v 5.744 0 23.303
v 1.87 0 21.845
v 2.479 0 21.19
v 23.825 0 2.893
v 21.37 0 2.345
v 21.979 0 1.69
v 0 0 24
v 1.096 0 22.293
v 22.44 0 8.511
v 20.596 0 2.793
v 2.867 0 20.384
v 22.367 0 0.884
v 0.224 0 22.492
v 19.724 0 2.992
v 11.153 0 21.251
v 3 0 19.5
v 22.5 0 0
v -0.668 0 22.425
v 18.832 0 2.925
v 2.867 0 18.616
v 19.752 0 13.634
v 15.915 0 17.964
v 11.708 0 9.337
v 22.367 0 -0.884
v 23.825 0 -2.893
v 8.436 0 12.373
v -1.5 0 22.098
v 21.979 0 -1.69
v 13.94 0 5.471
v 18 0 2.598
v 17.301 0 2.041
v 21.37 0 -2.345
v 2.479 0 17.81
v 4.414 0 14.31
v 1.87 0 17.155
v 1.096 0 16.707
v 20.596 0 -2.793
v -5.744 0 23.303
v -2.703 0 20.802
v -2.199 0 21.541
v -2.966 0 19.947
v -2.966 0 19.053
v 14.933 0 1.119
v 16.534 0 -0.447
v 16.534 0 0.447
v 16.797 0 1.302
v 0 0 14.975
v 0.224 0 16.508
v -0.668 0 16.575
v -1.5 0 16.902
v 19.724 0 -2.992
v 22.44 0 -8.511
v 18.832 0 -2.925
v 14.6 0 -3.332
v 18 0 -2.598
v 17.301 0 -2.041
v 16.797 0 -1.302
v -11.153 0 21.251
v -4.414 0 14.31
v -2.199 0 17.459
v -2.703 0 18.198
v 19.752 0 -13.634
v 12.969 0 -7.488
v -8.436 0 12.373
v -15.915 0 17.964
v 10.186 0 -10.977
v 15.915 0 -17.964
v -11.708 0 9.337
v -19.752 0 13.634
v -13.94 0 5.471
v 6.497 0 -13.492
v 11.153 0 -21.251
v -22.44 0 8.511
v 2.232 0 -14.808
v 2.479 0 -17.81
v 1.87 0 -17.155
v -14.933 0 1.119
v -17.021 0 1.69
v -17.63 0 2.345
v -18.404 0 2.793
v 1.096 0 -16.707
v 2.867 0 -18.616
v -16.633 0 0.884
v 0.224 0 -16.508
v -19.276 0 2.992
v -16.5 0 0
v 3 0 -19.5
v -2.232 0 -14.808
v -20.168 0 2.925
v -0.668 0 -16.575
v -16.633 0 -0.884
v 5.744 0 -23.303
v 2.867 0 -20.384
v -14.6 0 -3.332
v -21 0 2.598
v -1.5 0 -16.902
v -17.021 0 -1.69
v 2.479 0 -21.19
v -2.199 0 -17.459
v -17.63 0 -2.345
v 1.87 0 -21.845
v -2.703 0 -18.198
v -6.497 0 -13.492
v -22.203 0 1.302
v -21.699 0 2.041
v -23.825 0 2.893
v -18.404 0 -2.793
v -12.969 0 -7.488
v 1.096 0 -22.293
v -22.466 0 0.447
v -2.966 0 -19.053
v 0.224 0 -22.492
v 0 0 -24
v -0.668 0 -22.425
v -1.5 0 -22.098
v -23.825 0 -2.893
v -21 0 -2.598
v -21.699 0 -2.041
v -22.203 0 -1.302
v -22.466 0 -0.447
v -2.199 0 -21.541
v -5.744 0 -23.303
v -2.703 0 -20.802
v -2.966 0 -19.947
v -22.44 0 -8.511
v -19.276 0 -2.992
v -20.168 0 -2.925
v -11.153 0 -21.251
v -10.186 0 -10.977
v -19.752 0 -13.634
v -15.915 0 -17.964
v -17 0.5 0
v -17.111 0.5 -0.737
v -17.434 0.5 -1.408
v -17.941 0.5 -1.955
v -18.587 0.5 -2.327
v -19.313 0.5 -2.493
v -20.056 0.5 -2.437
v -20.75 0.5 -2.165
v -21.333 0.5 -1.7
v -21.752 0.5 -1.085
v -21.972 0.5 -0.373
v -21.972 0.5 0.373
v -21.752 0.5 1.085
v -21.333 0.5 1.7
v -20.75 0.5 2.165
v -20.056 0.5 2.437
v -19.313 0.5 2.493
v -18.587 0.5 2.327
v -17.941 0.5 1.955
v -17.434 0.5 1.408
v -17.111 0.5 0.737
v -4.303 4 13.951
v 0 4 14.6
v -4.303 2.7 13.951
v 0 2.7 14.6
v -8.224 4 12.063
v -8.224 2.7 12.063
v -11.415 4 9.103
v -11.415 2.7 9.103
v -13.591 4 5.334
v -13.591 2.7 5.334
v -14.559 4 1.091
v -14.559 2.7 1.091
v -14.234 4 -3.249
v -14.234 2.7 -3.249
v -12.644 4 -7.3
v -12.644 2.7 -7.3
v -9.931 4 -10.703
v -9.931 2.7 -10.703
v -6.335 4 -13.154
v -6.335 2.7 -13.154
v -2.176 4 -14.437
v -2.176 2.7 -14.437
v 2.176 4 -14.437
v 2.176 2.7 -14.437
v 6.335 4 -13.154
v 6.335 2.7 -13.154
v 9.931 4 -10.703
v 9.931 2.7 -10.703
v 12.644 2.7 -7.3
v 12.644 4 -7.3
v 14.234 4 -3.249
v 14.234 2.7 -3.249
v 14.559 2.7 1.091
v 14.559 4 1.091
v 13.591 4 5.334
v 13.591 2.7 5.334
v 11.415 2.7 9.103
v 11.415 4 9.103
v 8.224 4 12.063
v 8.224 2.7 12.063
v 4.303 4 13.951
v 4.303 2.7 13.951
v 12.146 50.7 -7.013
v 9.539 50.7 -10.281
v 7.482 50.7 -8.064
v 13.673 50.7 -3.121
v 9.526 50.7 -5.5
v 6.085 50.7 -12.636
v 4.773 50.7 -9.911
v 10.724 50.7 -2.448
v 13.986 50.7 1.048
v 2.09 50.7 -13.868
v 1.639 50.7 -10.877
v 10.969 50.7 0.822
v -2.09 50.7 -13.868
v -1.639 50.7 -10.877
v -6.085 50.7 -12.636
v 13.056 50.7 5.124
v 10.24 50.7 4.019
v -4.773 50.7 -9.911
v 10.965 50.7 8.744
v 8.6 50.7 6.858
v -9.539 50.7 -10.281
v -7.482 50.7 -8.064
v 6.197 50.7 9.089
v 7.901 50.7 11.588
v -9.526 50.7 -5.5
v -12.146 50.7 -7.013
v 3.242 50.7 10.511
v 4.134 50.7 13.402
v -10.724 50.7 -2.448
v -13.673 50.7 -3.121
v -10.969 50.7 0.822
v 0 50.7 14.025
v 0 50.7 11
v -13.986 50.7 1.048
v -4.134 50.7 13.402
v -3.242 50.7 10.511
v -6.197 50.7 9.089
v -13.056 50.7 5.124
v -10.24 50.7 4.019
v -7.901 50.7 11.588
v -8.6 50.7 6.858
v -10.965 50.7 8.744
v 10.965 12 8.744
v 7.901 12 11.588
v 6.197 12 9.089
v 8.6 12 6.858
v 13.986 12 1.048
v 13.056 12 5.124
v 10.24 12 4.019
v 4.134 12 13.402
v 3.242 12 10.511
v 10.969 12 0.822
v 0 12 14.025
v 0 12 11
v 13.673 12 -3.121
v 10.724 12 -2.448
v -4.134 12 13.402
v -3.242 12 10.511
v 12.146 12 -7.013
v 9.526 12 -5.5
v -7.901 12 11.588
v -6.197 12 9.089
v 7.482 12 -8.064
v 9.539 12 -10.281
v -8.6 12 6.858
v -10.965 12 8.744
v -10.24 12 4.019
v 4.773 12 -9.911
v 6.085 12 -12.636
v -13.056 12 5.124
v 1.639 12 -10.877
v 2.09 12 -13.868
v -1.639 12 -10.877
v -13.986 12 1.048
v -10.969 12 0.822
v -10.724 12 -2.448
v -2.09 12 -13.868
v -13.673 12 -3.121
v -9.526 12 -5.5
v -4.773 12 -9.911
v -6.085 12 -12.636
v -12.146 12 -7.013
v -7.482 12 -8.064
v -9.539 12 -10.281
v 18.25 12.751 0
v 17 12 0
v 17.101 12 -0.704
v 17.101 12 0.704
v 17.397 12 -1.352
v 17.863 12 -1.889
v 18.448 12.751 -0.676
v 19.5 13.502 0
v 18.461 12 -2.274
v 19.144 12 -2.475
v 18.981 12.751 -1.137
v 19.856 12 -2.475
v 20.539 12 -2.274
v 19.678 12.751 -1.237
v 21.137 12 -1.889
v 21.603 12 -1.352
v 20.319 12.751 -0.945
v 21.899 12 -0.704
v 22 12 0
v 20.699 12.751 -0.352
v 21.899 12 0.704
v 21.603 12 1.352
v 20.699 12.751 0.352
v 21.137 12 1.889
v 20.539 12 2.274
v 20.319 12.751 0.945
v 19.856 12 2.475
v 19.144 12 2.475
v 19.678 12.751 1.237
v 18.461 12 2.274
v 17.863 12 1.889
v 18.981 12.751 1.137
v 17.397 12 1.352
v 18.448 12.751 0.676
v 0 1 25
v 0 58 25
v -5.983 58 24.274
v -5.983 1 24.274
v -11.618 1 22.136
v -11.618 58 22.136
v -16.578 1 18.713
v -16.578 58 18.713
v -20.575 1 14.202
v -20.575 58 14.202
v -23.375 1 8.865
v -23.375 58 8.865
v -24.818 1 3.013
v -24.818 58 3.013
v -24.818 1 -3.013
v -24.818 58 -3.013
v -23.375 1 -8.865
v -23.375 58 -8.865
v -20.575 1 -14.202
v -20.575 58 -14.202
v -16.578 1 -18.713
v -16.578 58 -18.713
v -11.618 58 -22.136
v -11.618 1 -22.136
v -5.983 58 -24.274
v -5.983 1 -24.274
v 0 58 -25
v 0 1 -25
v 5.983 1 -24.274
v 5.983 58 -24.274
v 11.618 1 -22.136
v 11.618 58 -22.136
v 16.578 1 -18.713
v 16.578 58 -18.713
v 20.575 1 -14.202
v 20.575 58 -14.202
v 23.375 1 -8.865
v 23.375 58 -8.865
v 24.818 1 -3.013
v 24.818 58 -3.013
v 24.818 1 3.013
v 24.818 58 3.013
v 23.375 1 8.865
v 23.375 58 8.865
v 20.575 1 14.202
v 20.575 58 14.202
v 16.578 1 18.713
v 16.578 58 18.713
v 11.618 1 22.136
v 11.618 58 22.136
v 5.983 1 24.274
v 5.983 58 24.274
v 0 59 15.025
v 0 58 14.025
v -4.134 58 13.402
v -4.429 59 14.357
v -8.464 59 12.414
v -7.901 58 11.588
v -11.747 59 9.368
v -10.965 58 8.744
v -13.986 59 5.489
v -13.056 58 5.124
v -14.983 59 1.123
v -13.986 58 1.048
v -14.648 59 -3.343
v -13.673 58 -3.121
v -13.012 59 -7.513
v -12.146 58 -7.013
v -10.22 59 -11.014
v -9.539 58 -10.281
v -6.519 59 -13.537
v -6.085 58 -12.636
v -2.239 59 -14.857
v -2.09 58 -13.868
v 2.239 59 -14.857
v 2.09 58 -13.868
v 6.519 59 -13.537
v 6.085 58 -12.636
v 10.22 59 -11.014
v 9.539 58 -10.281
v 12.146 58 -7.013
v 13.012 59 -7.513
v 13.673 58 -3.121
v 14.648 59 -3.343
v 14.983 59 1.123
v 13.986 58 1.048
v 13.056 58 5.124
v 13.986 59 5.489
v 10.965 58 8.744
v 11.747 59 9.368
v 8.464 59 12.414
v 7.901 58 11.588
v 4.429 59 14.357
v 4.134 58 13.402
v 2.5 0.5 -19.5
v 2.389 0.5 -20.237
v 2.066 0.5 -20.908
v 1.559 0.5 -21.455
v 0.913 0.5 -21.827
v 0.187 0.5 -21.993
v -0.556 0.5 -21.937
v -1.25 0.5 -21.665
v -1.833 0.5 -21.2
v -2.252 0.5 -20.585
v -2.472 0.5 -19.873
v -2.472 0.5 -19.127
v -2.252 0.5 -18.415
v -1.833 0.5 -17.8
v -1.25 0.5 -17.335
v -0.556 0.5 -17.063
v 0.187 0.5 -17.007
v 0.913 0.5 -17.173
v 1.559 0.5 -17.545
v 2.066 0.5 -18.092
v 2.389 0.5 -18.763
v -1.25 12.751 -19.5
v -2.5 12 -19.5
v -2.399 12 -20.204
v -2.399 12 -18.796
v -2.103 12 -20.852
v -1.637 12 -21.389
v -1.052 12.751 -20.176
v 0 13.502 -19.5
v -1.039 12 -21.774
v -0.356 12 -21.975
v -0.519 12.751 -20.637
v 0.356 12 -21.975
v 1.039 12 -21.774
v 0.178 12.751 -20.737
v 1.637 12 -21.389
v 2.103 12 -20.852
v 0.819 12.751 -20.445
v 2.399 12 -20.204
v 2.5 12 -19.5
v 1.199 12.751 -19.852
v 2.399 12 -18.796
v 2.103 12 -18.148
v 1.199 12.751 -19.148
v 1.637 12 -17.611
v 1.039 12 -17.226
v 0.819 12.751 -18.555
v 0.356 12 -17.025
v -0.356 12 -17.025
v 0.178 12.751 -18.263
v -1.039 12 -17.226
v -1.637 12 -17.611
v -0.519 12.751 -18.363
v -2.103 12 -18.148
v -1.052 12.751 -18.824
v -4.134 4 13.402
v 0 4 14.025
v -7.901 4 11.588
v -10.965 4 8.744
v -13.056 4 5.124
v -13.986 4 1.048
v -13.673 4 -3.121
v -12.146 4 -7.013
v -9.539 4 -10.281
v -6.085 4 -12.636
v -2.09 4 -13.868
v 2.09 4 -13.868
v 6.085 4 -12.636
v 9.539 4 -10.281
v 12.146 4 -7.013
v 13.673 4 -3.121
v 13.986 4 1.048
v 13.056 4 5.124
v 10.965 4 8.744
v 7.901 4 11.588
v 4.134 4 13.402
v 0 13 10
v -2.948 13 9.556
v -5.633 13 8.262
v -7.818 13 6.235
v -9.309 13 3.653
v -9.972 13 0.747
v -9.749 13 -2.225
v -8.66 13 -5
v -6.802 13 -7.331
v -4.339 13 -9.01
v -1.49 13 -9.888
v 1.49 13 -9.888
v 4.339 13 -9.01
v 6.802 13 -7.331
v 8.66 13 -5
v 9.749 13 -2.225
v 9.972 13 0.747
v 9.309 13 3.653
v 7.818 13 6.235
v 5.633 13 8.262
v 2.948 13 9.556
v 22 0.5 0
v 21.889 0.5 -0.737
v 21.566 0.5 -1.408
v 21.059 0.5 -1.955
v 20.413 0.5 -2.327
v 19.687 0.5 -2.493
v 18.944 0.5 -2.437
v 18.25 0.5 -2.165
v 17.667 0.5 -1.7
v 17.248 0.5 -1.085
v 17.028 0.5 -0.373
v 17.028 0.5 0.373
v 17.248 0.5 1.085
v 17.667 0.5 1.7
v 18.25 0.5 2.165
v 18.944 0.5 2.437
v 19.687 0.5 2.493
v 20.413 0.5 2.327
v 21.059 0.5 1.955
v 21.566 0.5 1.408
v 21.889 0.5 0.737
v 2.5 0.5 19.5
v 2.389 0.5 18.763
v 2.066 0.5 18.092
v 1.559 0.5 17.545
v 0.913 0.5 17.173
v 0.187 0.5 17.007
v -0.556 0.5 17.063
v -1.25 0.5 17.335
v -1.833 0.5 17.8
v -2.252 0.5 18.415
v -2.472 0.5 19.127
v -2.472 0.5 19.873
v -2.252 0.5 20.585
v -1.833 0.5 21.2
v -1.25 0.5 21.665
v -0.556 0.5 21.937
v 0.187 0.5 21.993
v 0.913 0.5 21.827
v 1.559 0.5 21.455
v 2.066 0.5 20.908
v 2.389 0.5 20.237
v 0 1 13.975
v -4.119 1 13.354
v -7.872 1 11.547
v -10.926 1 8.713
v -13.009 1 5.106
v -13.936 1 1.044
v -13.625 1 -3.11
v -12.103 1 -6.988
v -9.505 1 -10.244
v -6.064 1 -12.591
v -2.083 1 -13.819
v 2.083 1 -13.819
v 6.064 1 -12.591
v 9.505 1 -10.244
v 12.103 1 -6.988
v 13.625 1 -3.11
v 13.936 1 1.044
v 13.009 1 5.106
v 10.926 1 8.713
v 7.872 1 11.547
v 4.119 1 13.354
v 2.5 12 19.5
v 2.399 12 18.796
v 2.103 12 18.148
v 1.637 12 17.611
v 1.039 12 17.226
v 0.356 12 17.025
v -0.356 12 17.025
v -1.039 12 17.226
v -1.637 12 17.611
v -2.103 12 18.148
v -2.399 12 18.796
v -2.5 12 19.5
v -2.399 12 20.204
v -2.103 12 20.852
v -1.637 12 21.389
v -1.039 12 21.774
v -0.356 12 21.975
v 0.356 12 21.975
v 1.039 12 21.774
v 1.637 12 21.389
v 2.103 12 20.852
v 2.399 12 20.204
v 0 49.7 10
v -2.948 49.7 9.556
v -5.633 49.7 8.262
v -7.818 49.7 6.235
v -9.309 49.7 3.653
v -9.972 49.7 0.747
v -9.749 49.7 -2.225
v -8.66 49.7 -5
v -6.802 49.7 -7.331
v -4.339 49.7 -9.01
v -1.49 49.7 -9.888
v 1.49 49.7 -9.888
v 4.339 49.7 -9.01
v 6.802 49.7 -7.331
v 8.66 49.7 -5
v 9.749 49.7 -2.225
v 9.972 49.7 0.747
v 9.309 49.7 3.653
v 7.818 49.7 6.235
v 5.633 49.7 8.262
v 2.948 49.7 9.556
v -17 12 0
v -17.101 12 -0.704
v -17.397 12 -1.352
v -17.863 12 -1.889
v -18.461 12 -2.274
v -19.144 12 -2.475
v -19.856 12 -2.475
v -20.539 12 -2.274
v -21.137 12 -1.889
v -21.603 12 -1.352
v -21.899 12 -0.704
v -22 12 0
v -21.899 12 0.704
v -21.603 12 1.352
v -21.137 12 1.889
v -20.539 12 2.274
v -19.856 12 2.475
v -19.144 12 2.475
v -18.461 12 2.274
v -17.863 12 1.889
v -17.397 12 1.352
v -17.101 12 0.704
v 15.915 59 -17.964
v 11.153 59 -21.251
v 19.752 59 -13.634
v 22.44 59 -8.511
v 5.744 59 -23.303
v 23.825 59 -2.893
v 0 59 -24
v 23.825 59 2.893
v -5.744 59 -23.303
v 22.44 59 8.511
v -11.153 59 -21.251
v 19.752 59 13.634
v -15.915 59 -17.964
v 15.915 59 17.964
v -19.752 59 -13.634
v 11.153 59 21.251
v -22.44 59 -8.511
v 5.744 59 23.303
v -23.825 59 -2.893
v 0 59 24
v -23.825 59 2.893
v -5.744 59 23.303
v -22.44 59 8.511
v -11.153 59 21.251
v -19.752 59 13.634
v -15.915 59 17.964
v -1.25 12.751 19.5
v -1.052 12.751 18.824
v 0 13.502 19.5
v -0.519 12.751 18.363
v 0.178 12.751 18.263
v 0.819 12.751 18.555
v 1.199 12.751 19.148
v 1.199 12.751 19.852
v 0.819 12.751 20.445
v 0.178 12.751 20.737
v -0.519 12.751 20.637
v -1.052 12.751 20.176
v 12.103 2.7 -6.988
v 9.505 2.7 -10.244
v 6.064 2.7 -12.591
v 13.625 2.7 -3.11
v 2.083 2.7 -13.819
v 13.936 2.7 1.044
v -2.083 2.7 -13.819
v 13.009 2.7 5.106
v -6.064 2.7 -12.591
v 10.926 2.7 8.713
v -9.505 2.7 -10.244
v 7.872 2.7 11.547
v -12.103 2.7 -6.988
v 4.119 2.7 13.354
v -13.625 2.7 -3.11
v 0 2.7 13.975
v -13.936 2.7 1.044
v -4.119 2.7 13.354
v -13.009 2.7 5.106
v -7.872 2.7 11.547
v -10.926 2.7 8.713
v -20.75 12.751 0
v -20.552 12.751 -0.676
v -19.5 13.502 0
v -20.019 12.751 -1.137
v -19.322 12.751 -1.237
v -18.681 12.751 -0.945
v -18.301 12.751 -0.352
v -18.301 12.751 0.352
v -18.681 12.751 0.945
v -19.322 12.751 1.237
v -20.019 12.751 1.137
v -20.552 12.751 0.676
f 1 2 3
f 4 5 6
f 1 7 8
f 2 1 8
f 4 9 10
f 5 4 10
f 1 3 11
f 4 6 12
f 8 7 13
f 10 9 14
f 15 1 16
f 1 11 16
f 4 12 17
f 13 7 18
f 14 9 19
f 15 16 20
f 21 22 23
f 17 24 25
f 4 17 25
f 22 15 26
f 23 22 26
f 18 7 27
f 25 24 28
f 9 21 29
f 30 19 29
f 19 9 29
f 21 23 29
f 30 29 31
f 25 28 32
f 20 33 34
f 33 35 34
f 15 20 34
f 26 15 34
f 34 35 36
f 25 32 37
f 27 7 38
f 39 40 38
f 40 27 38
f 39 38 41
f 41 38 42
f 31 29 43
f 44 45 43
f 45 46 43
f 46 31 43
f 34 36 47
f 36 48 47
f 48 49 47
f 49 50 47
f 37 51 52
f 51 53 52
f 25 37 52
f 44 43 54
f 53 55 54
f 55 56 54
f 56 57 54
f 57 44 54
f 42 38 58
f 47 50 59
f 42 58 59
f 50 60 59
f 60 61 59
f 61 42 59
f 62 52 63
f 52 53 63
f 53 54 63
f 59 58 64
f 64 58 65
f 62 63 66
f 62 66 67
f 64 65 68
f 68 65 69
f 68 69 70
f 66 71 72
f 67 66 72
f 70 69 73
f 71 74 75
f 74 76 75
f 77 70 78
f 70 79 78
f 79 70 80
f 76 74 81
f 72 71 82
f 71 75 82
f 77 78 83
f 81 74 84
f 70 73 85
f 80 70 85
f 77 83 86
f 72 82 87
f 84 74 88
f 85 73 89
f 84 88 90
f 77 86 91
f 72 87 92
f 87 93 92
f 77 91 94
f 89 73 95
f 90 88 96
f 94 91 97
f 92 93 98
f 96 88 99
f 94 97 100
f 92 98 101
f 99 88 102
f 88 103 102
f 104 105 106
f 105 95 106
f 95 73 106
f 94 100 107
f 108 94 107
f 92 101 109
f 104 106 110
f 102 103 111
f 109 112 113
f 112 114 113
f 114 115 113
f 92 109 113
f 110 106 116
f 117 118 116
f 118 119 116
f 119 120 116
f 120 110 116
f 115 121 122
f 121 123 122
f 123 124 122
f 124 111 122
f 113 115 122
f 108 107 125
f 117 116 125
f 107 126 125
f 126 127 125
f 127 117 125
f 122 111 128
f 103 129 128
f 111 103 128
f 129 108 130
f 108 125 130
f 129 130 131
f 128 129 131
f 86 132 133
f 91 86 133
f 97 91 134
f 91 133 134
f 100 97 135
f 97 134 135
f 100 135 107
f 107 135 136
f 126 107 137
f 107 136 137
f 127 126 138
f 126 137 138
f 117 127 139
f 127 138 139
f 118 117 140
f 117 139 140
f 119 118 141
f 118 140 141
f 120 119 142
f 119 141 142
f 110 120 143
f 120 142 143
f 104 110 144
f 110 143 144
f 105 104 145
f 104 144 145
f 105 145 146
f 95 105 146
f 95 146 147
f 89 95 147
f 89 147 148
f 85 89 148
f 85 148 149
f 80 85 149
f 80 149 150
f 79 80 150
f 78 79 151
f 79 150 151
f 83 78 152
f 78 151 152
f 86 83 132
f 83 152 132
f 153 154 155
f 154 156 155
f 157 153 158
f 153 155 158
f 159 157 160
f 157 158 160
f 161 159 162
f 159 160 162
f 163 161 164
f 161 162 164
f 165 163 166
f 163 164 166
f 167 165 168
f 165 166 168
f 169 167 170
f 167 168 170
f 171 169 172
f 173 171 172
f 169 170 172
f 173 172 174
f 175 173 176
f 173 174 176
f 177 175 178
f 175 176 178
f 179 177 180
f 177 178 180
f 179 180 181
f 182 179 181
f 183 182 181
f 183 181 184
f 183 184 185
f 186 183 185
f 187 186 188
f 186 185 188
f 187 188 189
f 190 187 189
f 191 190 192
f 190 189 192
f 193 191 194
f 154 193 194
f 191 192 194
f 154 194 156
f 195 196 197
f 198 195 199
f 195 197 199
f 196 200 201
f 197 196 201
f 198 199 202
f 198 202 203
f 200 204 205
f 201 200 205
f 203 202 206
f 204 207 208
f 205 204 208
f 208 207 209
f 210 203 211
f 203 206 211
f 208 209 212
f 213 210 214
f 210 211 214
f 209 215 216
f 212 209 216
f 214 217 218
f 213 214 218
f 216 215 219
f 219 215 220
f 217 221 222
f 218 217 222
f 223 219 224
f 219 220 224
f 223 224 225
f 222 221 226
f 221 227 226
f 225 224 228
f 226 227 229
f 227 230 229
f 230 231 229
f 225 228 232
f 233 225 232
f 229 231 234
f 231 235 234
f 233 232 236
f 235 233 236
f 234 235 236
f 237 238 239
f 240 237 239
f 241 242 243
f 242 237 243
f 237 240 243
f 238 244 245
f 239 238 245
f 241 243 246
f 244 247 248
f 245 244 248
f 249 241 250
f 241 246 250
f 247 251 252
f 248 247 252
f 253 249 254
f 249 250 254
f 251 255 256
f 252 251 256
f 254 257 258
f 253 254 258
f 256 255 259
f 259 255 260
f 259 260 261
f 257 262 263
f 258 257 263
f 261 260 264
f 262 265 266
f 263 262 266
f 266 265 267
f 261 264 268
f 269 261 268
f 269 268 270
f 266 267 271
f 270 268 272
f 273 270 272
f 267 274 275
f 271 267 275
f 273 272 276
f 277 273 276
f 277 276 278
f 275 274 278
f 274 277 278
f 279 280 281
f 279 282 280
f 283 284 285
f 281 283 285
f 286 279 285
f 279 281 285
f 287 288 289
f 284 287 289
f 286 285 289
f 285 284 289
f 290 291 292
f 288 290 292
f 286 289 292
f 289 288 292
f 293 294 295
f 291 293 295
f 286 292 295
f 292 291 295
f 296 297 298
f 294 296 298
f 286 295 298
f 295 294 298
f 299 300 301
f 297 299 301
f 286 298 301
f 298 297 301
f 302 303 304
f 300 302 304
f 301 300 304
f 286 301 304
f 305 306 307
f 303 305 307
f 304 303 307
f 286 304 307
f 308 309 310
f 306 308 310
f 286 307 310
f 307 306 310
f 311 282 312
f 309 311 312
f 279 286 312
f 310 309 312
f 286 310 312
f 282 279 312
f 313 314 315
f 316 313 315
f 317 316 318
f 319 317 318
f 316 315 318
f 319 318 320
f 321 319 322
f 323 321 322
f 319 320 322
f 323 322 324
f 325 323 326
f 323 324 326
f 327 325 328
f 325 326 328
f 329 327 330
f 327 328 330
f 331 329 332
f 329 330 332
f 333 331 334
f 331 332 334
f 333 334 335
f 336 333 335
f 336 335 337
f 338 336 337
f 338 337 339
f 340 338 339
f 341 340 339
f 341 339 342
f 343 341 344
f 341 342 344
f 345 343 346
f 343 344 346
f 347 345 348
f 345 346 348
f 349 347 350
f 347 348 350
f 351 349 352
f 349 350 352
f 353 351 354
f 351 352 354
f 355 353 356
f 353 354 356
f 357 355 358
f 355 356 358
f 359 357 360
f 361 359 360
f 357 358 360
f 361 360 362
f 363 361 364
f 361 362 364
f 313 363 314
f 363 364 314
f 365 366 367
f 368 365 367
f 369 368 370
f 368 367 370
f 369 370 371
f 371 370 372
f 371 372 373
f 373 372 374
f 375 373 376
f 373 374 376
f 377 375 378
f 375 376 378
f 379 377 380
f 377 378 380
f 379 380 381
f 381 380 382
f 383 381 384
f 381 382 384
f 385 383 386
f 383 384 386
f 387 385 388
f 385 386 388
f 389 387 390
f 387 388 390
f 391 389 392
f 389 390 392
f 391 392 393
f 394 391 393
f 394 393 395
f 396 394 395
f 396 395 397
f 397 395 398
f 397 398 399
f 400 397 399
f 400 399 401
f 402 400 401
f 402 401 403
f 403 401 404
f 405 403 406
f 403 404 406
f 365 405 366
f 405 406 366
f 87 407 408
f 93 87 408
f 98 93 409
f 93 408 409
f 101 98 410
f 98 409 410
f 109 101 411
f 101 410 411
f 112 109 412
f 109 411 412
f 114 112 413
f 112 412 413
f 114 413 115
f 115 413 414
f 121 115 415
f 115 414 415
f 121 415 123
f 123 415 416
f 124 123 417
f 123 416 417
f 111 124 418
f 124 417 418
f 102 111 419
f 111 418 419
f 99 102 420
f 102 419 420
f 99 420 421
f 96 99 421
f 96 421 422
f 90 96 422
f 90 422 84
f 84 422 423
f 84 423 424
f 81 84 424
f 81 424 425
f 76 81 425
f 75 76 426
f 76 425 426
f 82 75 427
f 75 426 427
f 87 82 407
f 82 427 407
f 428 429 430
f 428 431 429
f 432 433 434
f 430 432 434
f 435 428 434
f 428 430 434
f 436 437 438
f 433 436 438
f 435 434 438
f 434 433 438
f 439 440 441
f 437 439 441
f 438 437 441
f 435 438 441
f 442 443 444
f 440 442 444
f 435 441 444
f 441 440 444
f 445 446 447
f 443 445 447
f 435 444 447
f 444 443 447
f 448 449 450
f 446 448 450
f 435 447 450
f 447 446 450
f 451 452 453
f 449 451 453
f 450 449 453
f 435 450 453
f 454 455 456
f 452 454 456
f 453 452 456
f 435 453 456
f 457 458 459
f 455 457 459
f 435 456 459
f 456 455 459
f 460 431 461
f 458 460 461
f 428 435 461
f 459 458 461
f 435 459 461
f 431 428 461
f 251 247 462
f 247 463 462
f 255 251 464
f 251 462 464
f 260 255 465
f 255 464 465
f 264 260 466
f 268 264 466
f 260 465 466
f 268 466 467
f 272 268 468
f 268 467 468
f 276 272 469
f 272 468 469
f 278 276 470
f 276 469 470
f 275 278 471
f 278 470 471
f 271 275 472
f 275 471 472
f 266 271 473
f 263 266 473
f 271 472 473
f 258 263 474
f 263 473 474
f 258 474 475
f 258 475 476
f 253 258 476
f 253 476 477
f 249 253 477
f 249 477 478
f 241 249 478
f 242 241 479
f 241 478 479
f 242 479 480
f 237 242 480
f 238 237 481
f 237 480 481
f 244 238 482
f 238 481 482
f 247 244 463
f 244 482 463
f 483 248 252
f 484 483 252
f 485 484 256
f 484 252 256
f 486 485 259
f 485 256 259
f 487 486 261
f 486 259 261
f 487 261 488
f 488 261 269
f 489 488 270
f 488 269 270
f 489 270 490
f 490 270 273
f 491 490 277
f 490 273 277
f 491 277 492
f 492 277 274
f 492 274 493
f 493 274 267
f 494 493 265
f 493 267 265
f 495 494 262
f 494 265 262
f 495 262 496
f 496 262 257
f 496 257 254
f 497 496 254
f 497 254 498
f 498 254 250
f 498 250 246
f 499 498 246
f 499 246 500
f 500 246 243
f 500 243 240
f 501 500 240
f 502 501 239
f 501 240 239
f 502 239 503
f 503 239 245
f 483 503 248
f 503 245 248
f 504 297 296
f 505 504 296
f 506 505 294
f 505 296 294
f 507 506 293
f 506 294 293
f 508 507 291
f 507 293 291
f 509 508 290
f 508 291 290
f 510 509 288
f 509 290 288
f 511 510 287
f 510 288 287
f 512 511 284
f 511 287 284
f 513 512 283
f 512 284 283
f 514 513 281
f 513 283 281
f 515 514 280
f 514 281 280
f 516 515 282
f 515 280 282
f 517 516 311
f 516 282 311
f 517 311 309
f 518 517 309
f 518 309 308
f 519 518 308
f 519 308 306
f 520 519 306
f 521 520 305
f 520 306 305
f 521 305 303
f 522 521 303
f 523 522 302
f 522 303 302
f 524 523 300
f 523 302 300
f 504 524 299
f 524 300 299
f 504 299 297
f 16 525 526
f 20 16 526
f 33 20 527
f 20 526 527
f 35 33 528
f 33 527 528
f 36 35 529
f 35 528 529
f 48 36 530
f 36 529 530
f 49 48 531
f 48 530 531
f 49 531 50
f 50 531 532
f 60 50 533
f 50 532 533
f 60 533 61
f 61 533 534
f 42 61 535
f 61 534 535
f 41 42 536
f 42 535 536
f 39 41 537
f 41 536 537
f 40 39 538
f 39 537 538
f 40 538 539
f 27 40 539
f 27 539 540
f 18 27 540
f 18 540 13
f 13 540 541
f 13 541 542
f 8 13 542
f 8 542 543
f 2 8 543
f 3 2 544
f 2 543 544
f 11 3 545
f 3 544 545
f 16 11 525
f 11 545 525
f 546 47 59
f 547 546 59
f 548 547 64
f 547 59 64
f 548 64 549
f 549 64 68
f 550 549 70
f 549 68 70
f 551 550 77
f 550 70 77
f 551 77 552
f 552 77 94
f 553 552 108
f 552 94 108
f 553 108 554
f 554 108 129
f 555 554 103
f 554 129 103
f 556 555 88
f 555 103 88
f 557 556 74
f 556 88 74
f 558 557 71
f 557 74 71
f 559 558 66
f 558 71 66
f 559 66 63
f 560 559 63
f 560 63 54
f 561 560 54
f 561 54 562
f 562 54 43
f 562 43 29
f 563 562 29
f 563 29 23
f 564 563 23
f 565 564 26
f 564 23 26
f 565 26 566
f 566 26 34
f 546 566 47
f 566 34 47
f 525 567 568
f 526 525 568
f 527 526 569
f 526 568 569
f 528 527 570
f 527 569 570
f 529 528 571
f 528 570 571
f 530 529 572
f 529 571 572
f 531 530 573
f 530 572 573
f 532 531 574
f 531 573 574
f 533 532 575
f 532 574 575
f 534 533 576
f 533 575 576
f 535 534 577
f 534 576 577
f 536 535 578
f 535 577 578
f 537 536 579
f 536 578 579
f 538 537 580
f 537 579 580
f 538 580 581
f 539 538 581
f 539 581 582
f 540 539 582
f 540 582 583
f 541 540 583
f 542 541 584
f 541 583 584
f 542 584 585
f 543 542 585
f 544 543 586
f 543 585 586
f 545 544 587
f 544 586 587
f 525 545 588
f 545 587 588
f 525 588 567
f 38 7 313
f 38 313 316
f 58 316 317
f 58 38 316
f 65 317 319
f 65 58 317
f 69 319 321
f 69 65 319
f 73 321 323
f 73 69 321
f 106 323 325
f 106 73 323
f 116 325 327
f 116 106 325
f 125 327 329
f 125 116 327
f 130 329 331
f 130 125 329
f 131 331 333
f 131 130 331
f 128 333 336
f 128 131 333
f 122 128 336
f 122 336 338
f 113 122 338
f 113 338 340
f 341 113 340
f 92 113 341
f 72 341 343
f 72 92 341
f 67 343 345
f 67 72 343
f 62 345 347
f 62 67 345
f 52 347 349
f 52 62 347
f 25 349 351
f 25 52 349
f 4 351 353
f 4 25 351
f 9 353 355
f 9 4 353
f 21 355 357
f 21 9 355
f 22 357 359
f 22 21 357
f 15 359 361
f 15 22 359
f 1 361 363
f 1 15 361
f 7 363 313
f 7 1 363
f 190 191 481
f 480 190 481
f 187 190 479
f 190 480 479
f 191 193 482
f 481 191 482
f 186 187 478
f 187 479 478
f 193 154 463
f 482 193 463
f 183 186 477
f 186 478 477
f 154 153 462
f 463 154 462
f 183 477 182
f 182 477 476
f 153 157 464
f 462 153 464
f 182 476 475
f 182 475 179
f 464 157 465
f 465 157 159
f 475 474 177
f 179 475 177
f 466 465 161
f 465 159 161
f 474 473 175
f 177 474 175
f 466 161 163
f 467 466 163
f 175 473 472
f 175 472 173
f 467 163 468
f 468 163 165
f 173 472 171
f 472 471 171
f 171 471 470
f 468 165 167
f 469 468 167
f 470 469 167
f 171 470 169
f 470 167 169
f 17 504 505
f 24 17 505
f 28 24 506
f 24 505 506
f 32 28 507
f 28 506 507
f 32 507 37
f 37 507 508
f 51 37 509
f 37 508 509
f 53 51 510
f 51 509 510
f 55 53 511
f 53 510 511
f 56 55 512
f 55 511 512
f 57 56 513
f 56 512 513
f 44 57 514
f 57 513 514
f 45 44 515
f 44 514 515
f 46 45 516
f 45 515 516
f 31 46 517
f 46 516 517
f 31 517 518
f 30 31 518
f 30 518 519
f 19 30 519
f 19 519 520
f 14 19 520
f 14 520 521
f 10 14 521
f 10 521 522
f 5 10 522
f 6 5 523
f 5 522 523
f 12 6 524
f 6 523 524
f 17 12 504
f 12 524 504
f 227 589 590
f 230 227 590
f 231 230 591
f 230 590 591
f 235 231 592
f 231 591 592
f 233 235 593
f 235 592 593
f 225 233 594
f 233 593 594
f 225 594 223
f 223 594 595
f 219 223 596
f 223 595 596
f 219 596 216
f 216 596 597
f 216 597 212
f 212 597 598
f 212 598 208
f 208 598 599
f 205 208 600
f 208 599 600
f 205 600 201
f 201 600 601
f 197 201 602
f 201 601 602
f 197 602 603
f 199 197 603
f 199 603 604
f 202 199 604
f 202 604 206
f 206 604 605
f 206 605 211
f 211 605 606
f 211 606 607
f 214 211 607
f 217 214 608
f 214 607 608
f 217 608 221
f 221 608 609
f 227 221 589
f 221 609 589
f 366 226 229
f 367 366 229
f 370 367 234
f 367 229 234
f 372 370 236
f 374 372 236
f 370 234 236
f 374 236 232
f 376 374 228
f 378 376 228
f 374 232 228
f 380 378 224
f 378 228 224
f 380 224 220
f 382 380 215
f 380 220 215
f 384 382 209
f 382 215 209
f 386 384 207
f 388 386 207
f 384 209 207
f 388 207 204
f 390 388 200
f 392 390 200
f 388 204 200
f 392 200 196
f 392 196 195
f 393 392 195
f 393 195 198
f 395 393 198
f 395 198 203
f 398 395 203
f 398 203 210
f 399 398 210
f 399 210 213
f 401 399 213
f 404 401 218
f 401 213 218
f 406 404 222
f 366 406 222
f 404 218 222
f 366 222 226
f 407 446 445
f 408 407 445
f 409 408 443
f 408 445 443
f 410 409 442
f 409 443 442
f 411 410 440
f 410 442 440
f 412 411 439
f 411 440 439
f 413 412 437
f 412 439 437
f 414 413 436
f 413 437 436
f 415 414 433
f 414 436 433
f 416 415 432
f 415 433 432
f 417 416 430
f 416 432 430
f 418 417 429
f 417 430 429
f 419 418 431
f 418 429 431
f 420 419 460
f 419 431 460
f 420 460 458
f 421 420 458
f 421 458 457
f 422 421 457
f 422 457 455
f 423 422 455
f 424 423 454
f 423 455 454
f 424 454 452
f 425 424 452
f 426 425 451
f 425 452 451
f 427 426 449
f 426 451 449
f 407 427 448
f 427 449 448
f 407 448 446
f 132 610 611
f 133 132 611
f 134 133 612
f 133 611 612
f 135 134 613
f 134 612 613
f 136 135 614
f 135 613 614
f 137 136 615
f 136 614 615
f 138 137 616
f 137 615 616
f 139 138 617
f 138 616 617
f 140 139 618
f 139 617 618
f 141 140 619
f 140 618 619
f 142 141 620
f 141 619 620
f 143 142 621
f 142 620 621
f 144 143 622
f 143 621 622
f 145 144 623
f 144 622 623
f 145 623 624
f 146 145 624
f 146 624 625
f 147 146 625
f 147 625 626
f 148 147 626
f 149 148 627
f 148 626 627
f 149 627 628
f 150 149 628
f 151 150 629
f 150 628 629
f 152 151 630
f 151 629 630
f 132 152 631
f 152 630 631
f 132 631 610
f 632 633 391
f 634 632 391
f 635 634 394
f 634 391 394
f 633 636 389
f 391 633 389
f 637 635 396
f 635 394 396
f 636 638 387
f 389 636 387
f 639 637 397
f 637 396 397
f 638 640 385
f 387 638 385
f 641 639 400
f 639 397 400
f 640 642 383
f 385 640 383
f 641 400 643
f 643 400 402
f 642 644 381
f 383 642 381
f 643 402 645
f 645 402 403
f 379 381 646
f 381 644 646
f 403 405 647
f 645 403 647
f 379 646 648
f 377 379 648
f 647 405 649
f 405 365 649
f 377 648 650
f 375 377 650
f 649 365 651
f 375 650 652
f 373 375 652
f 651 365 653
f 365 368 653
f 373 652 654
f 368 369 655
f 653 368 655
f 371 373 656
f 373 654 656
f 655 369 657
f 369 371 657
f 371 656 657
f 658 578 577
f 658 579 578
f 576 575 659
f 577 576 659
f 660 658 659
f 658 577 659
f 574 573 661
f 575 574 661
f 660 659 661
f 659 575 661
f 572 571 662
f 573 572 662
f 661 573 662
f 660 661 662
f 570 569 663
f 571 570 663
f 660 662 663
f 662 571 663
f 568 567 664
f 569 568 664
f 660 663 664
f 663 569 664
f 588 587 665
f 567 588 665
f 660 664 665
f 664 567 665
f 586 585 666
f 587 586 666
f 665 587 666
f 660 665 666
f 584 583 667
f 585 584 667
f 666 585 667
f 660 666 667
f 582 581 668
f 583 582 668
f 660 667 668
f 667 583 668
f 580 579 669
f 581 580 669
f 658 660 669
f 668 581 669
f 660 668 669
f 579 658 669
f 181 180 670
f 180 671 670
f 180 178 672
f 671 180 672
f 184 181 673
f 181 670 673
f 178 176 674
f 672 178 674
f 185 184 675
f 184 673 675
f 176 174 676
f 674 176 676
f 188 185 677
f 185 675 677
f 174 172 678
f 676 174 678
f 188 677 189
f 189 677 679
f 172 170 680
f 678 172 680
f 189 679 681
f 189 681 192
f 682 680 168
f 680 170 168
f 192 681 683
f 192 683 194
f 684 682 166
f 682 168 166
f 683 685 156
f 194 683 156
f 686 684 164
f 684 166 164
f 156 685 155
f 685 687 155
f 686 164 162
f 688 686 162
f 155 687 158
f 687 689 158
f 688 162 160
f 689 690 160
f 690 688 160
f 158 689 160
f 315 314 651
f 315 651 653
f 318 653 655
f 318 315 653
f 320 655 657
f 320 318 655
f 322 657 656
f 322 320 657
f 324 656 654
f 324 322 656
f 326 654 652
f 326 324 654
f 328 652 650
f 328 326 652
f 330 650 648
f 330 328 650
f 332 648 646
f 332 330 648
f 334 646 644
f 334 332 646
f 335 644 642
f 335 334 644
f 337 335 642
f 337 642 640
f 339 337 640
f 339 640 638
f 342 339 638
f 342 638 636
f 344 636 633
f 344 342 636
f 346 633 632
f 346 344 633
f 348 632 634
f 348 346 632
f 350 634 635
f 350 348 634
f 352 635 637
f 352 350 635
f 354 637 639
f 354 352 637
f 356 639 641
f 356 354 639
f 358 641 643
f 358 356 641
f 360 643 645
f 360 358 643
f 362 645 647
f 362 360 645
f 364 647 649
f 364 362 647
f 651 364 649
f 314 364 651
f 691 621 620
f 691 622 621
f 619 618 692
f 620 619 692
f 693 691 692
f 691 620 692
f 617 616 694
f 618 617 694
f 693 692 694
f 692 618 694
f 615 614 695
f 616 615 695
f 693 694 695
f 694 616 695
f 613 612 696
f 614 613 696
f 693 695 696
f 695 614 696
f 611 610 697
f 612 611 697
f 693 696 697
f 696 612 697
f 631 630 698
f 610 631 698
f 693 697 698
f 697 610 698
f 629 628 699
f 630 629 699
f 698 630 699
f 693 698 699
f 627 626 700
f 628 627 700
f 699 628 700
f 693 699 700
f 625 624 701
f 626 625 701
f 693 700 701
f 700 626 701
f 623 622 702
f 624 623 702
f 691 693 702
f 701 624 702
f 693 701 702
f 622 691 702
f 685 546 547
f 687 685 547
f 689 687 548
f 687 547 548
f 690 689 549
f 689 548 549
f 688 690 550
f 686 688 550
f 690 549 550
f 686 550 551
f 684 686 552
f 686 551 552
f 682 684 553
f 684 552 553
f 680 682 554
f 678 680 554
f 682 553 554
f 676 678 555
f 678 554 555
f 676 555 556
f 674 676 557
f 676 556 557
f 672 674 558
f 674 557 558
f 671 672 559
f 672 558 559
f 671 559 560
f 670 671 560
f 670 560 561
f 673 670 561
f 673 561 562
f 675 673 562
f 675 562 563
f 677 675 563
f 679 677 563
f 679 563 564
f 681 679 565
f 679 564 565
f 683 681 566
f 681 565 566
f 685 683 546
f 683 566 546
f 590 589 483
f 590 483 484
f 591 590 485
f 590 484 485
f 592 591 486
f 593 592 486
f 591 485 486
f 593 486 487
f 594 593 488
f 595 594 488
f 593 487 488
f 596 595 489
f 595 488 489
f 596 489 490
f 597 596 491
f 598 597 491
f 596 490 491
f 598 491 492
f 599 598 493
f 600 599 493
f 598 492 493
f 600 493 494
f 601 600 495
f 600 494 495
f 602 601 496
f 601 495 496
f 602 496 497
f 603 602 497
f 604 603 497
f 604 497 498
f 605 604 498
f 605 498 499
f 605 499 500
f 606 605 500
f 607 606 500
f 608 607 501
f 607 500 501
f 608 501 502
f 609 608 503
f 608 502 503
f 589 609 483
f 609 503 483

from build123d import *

# Parameters (mm, degrees)
ZKOSEN_1_SIZE   = 1
M6_Z_VIT1_D     = 5
M6_Z_VIT1_DEPTH = 12
M6_Z_VIT1_TIP   = 1.502151548
ZKOSEN_2_SIZE   = 1
ZKOSEN_3_SIZE   = 0.5


with BuildPart() as part:
    # Skica1 → Rotovat1 (revolve)
    with BuildSketch(Plane.XY, mode=Mode.PRIVATE) as rotovat1_sk:
        Polygon((-25, 0), (-25, 59), (-14.025, 59), (-14.025, 50.7), (-10, 50.7), (-10, 11.999895833), (-14.025, 11.999895833), (-14.025, 3.999895833), (-14.6, 3.999895833), (-14.6, 2.699895833), (-13.975, 2.699895833), (-13.975, 0), align=None)
    revolve(rotovat1_sk.sketch.rotate(Axis((0, 0, 0), (0, -1, 0)), 270), axis=Axis((0, 0, 0), (0, -1, 0)))

    # Zkosení1
    zkosen_1_edges = [part.edges().sort_by_distance(p)[0] for p in [
        (0, 11.999895833, -10),
        (0, 50.7, -10),
        (0, 59, -14.025),
        (0, 0, -13.975),
    ]]
    chamfer(zkosen_1_edges, length=ZKOSEN_1_SIZE)

    # M6 závit1
    with Locations(Plane(origin=(0, 0, 0), x_dir=(-1, 0, 0), z_dir=(0, -1, 0))):
        with Locations((0, 19.5), (19.5, 0), (0, -19.5), (-19.5, 0)):
            Hole(M6_Z_VIT1_D / 2, depth=M6_Z_VIT1_DEPTH)
            with Locations((0, 0, -(M6_Z_VIT1_DEPTH + M6_Z_VIT1_TIP / 2))):  # 118° drill point
                Cone(0, M6_Z_VIT1_D / 2, M6_Z_VIT1_TIP, mode=Mode.SUBTRACT)

    # Zkosení2
    zkosen_2_edges = [part.edges().sort_by_distance(p)[0] for p in [
        (0, 59, -25),
        (0, 0, -25),
    ]]
    chamfer(zkosen_2_edges, length=ZKOSEN_2_SIZE)

    # Zkosení3
    zkosen_3_edges = [part.edges().sort_by_distance(p)[0] for p in [
        (17, 0, 0),
        (-2.5, 0, 19.5),
        (-22, 0, 0),
        (-2.5, 0, -19.5),
    ]]
    chamfer(zkosen_3_edges, length=ZKOSEN_3_SIZE)


solid = part.part
